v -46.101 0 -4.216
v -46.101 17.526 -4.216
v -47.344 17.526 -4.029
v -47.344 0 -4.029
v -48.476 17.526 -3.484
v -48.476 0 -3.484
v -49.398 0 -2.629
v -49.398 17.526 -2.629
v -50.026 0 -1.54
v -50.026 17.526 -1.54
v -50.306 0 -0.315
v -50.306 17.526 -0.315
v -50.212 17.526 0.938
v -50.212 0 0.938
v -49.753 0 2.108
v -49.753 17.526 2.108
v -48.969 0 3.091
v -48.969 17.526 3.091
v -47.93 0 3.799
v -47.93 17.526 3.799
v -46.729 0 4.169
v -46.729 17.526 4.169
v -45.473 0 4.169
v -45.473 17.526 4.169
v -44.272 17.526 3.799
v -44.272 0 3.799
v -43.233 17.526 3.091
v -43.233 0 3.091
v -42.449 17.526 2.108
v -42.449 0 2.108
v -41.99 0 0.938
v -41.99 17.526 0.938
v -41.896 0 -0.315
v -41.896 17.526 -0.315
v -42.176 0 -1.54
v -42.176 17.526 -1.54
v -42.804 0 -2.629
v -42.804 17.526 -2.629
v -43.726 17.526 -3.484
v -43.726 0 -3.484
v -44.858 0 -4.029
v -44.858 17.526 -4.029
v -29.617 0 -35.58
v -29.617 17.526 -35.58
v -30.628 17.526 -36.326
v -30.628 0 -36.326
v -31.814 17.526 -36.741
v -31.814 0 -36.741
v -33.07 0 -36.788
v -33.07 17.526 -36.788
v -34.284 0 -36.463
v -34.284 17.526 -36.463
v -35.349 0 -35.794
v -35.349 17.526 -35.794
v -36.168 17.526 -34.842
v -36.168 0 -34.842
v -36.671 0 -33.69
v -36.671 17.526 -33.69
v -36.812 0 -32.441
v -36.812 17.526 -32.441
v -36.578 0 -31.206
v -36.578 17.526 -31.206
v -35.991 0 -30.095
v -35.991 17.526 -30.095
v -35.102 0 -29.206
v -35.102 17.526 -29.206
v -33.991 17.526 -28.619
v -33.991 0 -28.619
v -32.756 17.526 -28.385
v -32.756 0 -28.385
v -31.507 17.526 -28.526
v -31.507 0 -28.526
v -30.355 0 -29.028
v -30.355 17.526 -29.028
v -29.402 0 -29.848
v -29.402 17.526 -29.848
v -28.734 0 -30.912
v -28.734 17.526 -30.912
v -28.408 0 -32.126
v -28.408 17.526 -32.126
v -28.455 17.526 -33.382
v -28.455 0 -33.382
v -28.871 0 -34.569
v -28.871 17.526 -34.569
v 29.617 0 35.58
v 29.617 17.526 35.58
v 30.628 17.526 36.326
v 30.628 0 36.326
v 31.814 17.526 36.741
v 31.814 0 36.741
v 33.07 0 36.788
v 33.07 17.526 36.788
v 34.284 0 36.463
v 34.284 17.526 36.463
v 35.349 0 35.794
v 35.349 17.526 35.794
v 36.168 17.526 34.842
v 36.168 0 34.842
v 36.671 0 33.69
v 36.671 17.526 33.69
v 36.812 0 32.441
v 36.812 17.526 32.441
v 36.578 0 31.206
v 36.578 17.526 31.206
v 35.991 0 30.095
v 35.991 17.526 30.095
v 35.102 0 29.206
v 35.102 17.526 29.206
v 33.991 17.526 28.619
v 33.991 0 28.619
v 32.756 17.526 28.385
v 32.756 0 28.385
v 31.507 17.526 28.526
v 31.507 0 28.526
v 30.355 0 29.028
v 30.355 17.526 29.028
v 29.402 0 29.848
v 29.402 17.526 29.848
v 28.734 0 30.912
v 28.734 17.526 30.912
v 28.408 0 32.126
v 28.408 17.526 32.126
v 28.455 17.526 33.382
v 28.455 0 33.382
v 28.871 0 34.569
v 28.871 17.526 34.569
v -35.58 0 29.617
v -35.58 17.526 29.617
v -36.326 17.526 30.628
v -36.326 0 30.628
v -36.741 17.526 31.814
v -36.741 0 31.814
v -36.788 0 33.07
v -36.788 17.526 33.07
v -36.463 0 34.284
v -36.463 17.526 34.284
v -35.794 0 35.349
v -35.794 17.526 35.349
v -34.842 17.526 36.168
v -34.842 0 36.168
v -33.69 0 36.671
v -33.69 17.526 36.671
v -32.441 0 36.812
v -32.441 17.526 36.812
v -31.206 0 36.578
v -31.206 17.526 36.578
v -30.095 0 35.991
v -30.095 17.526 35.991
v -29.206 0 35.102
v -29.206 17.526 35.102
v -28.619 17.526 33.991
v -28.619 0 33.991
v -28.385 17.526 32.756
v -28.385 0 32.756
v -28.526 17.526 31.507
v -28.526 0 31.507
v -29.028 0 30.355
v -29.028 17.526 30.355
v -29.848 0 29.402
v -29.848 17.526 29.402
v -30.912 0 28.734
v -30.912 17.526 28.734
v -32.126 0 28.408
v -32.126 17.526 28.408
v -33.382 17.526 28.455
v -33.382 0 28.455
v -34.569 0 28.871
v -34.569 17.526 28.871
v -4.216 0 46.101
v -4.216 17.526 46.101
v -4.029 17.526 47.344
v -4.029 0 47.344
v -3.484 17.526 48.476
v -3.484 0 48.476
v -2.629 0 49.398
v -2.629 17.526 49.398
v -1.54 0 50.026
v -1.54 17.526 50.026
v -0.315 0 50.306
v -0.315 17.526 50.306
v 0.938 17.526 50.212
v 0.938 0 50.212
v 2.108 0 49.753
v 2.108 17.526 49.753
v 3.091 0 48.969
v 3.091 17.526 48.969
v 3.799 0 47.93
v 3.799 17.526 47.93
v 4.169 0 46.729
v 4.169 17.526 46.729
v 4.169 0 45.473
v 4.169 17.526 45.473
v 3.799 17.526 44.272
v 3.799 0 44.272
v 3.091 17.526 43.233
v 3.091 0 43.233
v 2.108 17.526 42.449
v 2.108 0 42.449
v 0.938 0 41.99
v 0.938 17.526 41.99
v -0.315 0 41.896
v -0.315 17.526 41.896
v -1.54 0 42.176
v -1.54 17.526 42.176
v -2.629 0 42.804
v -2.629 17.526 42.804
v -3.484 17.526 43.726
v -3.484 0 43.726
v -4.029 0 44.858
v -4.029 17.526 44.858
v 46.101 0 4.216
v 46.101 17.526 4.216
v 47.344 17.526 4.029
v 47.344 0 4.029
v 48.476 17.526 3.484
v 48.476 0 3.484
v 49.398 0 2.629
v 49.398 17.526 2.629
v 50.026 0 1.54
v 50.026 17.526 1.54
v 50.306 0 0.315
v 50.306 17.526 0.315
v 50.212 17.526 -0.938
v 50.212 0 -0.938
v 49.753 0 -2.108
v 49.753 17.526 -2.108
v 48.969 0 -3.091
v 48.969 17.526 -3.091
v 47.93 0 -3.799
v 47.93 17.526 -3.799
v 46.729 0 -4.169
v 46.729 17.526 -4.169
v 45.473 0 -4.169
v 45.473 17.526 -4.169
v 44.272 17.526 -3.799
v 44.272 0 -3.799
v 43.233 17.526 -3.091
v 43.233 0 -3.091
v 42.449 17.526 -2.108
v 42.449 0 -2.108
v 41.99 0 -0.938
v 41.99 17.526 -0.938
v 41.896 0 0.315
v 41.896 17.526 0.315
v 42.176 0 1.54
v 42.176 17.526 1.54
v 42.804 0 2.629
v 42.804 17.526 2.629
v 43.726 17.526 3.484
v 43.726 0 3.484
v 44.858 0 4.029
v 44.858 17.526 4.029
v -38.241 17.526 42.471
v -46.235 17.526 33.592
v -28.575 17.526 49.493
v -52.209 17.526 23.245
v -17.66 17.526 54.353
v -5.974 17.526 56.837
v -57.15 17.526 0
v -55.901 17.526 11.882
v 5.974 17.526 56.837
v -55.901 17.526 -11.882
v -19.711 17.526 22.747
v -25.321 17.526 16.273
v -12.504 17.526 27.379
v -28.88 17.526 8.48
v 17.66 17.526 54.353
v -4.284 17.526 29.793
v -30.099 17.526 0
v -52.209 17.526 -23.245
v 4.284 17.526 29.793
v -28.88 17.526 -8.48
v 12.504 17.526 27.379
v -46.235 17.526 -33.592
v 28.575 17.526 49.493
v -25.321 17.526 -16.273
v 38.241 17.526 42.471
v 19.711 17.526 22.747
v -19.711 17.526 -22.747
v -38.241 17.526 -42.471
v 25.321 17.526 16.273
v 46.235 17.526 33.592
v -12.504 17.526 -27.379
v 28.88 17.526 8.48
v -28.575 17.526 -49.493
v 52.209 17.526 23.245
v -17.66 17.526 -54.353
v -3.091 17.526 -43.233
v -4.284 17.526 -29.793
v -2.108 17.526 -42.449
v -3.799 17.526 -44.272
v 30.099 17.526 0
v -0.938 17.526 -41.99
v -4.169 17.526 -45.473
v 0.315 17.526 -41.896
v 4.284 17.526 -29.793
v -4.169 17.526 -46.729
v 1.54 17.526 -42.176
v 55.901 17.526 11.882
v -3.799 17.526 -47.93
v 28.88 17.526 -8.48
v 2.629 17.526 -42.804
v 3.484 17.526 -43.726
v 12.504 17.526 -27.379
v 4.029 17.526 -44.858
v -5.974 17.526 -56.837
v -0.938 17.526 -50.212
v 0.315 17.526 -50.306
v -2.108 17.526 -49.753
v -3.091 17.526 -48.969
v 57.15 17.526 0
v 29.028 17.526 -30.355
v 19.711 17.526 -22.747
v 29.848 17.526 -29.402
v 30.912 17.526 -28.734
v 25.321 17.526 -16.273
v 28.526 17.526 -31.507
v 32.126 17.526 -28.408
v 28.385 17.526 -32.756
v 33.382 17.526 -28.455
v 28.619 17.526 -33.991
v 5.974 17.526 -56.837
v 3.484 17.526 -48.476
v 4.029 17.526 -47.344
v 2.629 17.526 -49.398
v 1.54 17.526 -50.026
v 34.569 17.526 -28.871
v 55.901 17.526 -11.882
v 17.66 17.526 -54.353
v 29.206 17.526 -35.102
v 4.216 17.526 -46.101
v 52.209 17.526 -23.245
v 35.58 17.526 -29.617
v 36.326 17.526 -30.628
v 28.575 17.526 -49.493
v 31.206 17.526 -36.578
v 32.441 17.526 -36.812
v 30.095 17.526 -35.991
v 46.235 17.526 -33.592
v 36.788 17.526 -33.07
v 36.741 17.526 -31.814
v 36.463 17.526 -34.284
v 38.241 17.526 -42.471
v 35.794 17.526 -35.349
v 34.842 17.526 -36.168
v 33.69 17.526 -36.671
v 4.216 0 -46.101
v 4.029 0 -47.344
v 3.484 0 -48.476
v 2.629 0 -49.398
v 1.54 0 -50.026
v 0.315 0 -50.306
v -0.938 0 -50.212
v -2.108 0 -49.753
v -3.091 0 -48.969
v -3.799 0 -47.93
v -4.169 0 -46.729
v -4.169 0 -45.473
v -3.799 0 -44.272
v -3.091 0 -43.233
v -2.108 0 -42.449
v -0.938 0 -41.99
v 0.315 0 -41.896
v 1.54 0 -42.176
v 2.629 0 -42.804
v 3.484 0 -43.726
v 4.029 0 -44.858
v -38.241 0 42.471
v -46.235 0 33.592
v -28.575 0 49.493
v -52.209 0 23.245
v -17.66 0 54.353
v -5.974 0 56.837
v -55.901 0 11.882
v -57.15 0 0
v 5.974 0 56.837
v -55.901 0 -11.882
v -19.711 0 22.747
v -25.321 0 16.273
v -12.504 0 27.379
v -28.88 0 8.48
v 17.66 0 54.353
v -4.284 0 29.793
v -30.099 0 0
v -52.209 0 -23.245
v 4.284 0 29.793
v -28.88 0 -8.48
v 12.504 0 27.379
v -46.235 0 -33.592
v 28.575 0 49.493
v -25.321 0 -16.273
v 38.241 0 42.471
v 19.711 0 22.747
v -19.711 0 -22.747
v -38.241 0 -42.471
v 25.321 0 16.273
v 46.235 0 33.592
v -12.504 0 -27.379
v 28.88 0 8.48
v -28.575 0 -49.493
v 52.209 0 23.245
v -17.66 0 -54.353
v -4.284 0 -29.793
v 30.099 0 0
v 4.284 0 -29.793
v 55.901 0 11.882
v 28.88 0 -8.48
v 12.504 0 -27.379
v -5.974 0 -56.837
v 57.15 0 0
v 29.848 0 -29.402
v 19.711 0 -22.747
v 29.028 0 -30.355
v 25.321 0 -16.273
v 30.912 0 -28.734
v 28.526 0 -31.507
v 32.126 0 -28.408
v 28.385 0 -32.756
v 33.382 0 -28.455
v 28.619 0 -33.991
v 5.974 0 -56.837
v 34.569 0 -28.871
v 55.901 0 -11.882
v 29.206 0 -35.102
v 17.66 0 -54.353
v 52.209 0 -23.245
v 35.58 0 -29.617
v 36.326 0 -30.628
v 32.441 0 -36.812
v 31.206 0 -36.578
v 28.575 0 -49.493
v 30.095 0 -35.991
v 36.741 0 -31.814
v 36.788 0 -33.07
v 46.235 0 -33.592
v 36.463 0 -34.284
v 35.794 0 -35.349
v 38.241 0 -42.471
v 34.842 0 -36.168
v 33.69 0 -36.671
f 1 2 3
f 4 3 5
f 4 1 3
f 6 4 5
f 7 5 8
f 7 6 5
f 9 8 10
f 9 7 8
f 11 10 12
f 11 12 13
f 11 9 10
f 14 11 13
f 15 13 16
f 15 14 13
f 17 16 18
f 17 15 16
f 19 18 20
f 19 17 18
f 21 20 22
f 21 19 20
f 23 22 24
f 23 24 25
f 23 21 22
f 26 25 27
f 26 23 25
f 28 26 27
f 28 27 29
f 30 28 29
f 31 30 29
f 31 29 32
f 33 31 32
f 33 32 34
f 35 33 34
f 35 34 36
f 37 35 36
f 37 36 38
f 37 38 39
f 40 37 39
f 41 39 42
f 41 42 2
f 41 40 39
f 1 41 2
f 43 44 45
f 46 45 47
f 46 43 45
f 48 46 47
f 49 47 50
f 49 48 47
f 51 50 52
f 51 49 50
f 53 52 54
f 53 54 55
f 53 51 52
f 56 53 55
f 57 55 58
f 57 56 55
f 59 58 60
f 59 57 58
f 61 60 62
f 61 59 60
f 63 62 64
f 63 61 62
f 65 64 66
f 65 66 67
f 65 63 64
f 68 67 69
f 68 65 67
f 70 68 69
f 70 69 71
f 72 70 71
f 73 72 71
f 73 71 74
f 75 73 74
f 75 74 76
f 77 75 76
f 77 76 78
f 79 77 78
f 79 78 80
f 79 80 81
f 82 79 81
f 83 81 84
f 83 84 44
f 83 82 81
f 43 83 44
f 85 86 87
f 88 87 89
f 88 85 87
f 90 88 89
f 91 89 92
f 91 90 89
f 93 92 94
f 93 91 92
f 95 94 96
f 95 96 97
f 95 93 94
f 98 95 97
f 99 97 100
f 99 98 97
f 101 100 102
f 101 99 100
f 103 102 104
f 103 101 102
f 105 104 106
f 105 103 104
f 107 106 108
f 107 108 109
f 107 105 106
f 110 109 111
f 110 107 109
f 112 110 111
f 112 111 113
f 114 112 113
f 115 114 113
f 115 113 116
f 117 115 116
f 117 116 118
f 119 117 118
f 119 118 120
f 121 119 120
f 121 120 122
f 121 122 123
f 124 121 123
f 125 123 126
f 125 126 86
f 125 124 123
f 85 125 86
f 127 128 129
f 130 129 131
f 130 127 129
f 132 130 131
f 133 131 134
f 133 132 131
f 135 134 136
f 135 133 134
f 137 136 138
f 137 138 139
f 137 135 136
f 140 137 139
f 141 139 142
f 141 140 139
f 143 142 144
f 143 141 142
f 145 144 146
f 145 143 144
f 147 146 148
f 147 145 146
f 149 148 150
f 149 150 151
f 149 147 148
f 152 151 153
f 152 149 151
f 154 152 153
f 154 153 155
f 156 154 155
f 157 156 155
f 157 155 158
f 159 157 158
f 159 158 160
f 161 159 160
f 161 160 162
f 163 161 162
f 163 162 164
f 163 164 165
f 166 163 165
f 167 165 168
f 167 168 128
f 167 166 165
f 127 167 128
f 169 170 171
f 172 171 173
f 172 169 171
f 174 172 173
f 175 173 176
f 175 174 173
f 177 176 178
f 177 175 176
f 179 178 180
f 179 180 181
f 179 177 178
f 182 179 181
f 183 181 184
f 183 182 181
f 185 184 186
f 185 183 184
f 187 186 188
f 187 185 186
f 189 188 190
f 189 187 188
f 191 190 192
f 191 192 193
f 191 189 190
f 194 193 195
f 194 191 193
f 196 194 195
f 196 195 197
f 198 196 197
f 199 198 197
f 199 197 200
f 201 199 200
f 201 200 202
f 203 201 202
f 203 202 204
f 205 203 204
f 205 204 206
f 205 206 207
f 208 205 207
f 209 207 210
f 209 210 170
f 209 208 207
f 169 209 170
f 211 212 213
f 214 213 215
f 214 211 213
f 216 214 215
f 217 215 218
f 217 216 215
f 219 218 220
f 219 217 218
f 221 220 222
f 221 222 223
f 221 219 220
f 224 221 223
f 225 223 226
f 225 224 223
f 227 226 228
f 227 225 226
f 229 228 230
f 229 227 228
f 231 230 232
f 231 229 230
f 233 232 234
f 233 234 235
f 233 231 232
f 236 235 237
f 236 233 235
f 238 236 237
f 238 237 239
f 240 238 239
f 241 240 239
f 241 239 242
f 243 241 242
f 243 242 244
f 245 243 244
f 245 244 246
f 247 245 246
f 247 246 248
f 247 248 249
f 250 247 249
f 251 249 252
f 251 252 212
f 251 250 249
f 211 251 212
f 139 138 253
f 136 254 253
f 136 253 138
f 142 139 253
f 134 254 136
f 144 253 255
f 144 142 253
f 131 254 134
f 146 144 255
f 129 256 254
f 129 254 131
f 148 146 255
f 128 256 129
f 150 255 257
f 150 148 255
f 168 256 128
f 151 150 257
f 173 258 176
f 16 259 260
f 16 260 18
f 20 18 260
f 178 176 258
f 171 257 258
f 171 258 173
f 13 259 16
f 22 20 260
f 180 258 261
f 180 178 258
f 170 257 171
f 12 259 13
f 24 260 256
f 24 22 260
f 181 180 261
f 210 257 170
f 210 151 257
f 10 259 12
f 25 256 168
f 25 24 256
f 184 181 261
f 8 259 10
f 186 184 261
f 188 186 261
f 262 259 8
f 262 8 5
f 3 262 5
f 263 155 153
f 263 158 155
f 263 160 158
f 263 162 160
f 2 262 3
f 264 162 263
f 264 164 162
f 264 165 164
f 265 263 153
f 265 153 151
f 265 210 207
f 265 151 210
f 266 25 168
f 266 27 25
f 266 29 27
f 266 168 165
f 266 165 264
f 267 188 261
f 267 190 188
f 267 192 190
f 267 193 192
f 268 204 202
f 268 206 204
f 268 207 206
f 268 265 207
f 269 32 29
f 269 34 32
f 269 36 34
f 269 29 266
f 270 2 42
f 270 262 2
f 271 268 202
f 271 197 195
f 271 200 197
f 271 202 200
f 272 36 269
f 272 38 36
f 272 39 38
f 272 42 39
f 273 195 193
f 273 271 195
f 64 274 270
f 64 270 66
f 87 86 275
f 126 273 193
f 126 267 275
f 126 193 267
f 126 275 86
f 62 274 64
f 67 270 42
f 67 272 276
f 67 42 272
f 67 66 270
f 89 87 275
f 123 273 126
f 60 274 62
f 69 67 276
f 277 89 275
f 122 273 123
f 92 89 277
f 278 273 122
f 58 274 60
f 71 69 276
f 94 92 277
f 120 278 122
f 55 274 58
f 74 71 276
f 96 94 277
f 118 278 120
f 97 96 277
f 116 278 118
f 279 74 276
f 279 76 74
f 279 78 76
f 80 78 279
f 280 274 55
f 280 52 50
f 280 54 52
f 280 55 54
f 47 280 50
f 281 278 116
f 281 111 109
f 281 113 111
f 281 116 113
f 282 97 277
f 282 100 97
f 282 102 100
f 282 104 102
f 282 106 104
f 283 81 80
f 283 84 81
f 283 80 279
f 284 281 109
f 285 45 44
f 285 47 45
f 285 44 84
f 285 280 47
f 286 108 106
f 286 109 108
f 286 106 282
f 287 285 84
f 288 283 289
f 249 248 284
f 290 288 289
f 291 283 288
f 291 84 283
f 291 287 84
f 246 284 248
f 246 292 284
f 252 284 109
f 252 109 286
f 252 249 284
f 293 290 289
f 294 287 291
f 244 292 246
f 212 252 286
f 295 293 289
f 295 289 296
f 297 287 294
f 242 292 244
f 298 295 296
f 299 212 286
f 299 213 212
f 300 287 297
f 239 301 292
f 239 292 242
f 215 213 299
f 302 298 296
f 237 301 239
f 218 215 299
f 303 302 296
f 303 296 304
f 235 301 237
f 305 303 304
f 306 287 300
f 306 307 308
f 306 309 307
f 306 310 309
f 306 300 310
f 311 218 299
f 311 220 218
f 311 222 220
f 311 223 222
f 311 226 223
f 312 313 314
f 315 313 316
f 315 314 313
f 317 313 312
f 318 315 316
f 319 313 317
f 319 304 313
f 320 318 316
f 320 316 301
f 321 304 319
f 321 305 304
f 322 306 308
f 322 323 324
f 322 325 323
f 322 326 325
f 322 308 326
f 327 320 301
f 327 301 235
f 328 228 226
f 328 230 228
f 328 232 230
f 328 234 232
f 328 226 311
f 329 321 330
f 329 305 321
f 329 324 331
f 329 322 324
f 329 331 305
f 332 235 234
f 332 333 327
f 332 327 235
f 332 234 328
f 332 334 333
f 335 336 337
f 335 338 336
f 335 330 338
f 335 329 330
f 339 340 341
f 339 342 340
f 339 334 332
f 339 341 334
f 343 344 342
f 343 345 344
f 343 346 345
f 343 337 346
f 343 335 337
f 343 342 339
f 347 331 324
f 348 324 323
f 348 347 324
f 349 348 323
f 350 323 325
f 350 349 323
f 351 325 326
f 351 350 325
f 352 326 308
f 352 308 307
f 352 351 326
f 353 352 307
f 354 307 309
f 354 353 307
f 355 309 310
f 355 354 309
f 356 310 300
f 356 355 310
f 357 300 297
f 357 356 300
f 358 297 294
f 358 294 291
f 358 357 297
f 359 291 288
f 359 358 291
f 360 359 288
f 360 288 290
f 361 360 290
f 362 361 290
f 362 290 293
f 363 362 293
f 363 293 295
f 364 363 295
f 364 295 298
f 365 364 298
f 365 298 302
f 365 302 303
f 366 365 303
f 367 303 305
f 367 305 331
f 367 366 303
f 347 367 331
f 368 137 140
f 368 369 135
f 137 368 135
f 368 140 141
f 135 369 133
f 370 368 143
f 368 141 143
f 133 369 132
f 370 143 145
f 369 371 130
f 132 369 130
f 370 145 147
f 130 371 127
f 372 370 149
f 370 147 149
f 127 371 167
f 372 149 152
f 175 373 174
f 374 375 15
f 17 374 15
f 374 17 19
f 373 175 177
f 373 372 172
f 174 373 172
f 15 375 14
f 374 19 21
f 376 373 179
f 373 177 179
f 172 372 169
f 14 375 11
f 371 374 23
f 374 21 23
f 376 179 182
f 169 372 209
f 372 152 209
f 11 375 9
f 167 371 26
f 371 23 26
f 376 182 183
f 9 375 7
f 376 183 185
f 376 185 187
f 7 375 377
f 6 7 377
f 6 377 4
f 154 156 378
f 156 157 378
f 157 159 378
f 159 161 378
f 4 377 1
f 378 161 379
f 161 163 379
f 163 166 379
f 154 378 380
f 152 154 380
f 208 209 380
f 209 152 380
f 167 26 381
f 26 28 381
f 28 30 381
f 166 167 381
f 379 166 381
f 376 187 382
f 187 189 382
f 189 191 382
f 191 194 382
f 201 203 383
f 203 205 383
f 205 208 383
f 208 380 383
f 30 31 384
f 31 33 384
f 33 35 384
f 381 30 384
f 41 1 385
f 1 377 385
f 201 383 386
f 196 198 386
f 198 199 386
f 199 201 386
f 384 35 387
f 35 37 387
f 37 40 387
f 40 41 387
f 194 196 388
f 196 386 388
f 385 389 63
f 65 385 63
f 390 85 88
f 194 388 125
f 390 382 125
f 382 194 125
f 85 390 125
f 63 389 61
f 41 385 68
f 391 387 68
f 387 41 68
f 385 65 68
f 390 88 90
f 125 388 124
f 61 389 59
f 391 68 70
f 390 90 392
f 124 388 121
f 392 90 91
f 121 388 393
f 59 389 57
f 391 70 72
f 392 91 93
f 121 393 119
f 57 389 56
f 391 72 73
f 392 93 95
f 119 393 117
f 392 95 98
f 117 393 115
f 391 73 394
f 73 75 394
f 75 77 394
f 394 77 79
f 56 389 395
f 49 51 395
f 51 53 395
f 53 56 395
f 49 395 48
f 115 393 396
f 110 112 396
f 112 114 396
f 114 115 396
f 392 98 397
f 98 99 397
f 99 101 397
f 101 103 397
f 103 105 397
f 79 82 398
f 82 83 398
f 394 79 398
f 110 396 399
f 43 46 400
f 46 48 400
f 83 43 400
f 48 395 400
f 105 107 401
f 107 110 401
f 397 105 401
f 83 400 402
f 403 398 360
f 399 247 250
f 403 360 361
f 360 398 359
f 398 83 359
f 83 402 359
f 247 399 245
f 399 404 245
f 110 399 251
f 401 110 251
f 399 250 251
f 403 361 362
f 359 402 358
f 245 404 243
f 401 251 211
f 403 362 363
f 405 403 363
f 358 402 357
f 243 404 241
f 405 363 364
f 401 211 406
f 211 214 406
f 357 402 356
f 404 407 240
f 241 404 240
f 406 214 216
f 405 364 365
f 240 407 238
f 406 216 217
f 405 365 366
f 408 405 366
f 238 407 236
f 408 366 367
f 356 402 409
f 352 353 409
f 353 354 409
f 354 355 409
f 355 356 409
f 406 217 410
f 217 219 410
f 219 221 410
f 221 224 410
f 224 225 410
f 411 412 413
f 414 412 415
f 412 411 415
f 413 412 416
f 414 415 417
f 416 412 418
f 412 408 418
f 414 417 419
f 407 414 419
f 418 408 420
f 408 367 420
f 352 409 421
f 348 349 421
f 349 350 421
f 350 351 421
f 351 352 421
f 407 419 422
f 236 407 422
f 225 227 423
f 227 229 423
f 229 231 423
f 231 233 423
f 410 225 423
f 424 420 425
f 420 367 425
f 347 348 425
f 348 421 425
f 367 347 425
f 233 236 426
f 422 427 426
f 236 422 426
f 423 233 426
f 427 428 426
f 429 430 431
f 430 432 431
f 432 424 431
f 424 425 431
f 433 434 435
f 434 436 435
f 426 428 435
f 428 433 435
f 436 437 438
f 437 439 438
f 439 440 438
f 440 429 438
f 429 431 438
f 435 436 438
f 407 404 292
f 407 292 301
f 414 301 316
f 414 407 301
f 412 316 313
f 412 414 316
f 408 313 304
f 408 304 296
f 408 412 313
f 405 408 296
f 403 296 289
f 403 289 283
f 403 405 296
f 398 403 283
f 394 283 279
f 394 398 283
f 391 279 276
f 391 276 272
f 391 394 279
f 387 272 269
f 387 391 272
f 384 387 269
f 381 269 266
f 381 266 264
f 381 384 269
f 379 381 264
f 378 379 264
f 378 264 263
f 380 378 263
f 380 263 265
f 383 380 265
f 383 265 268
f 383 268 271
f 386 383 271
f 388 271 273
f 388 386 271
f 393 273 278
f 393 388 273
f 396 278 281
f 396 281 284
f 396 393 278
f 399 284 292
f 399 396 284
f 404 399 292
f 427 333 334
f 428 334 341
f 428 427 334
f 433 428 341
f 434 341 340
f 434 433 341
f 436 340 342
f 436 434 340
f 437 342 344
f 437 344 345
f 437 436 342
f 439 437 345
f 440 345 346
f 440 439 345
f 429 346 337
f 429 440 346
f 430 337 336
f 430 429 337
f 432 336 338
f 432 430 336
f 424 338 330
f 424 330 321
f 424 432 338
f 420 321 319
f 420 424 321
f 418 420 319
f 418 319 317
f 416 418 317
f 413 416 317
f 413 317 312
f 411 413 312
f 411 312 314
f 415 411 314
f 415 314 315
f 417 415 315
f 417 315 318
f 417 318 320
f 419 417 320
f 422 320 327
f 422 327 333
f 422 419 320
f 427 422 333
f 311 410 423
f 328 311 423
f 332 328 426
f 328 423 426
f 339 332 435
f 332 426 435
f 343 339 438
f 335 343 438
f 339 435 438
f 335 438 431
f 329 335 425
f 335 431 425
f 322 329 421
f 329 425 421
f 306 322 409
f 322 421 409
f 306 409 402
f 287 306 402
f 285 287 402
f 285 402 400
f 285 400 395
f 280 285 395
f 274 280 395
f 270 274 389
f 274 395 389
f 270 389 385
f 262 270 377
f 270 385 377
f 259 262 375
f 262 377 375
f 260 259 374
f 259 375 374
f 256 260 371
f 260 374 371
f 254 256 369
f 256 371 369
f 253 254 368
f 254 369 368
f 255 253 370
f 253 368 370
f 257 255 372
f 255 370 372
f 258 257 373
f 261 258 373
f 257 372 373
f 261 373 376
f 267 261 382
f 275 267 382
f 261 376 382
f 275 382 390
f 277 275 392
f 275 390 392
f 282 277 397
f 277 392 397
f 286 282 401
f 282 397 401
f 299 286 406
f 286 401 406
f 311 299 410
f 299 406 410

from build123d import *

# Parameters (mm, degrees)
SKETCH1_R           = 57.15
SKETCH1_R_2         = 30.099
EXTRUDE_THIN1_DEPTH = 17.526
SKETCH2_R           = 4.2164
CUT_EXTRUDE2_DEPTH  = 17.526
CIRPATTERN1_COUNT   = 8


with BuildPart() as part:
    # Sketch1 → Extrude-Thin1 (new body)
    with BuildSketch(Plane(origin=(0, 0, 0), x_dir=(1, 0, 0), z_dir=(0, 1, 0))):
        Circle(SKETCH1_R)
        Circle(SKETCH1_R_2, mode=Mode.SUBTRACT)
    extrude(amount=EXTRUDE_THIN1_DEPTH)

    # Sketch2 → Cut-Extrude2 (cut)
    with BuildSketch(Plane(origin=(0, 0, 0), x_dir=(1, 0, 0), z_dir=(0, 1, 0))):
        with Locations((0, 46.101)):
            Circle(SKETCH2_R)
    cut_extrude2 = extrude(amount=CUT_EXTRUDE2_DEPTH, mode=Mode.SUBTRACT)

    # CirPattern1: Cut-Extrude2 ×8 about axis
    cirpattern1_axis = Axis((0, 58.676993495, 0), (0, -1, 0))
    for i in range(1, CIRPATTERN1_COUNT):
        add(cut_extrude2.rotate(cirpattern1_axis, i * 360 / CIRPATTERN1_COUNT), mode=Mode.SUBTRACT)


solid = part.part
